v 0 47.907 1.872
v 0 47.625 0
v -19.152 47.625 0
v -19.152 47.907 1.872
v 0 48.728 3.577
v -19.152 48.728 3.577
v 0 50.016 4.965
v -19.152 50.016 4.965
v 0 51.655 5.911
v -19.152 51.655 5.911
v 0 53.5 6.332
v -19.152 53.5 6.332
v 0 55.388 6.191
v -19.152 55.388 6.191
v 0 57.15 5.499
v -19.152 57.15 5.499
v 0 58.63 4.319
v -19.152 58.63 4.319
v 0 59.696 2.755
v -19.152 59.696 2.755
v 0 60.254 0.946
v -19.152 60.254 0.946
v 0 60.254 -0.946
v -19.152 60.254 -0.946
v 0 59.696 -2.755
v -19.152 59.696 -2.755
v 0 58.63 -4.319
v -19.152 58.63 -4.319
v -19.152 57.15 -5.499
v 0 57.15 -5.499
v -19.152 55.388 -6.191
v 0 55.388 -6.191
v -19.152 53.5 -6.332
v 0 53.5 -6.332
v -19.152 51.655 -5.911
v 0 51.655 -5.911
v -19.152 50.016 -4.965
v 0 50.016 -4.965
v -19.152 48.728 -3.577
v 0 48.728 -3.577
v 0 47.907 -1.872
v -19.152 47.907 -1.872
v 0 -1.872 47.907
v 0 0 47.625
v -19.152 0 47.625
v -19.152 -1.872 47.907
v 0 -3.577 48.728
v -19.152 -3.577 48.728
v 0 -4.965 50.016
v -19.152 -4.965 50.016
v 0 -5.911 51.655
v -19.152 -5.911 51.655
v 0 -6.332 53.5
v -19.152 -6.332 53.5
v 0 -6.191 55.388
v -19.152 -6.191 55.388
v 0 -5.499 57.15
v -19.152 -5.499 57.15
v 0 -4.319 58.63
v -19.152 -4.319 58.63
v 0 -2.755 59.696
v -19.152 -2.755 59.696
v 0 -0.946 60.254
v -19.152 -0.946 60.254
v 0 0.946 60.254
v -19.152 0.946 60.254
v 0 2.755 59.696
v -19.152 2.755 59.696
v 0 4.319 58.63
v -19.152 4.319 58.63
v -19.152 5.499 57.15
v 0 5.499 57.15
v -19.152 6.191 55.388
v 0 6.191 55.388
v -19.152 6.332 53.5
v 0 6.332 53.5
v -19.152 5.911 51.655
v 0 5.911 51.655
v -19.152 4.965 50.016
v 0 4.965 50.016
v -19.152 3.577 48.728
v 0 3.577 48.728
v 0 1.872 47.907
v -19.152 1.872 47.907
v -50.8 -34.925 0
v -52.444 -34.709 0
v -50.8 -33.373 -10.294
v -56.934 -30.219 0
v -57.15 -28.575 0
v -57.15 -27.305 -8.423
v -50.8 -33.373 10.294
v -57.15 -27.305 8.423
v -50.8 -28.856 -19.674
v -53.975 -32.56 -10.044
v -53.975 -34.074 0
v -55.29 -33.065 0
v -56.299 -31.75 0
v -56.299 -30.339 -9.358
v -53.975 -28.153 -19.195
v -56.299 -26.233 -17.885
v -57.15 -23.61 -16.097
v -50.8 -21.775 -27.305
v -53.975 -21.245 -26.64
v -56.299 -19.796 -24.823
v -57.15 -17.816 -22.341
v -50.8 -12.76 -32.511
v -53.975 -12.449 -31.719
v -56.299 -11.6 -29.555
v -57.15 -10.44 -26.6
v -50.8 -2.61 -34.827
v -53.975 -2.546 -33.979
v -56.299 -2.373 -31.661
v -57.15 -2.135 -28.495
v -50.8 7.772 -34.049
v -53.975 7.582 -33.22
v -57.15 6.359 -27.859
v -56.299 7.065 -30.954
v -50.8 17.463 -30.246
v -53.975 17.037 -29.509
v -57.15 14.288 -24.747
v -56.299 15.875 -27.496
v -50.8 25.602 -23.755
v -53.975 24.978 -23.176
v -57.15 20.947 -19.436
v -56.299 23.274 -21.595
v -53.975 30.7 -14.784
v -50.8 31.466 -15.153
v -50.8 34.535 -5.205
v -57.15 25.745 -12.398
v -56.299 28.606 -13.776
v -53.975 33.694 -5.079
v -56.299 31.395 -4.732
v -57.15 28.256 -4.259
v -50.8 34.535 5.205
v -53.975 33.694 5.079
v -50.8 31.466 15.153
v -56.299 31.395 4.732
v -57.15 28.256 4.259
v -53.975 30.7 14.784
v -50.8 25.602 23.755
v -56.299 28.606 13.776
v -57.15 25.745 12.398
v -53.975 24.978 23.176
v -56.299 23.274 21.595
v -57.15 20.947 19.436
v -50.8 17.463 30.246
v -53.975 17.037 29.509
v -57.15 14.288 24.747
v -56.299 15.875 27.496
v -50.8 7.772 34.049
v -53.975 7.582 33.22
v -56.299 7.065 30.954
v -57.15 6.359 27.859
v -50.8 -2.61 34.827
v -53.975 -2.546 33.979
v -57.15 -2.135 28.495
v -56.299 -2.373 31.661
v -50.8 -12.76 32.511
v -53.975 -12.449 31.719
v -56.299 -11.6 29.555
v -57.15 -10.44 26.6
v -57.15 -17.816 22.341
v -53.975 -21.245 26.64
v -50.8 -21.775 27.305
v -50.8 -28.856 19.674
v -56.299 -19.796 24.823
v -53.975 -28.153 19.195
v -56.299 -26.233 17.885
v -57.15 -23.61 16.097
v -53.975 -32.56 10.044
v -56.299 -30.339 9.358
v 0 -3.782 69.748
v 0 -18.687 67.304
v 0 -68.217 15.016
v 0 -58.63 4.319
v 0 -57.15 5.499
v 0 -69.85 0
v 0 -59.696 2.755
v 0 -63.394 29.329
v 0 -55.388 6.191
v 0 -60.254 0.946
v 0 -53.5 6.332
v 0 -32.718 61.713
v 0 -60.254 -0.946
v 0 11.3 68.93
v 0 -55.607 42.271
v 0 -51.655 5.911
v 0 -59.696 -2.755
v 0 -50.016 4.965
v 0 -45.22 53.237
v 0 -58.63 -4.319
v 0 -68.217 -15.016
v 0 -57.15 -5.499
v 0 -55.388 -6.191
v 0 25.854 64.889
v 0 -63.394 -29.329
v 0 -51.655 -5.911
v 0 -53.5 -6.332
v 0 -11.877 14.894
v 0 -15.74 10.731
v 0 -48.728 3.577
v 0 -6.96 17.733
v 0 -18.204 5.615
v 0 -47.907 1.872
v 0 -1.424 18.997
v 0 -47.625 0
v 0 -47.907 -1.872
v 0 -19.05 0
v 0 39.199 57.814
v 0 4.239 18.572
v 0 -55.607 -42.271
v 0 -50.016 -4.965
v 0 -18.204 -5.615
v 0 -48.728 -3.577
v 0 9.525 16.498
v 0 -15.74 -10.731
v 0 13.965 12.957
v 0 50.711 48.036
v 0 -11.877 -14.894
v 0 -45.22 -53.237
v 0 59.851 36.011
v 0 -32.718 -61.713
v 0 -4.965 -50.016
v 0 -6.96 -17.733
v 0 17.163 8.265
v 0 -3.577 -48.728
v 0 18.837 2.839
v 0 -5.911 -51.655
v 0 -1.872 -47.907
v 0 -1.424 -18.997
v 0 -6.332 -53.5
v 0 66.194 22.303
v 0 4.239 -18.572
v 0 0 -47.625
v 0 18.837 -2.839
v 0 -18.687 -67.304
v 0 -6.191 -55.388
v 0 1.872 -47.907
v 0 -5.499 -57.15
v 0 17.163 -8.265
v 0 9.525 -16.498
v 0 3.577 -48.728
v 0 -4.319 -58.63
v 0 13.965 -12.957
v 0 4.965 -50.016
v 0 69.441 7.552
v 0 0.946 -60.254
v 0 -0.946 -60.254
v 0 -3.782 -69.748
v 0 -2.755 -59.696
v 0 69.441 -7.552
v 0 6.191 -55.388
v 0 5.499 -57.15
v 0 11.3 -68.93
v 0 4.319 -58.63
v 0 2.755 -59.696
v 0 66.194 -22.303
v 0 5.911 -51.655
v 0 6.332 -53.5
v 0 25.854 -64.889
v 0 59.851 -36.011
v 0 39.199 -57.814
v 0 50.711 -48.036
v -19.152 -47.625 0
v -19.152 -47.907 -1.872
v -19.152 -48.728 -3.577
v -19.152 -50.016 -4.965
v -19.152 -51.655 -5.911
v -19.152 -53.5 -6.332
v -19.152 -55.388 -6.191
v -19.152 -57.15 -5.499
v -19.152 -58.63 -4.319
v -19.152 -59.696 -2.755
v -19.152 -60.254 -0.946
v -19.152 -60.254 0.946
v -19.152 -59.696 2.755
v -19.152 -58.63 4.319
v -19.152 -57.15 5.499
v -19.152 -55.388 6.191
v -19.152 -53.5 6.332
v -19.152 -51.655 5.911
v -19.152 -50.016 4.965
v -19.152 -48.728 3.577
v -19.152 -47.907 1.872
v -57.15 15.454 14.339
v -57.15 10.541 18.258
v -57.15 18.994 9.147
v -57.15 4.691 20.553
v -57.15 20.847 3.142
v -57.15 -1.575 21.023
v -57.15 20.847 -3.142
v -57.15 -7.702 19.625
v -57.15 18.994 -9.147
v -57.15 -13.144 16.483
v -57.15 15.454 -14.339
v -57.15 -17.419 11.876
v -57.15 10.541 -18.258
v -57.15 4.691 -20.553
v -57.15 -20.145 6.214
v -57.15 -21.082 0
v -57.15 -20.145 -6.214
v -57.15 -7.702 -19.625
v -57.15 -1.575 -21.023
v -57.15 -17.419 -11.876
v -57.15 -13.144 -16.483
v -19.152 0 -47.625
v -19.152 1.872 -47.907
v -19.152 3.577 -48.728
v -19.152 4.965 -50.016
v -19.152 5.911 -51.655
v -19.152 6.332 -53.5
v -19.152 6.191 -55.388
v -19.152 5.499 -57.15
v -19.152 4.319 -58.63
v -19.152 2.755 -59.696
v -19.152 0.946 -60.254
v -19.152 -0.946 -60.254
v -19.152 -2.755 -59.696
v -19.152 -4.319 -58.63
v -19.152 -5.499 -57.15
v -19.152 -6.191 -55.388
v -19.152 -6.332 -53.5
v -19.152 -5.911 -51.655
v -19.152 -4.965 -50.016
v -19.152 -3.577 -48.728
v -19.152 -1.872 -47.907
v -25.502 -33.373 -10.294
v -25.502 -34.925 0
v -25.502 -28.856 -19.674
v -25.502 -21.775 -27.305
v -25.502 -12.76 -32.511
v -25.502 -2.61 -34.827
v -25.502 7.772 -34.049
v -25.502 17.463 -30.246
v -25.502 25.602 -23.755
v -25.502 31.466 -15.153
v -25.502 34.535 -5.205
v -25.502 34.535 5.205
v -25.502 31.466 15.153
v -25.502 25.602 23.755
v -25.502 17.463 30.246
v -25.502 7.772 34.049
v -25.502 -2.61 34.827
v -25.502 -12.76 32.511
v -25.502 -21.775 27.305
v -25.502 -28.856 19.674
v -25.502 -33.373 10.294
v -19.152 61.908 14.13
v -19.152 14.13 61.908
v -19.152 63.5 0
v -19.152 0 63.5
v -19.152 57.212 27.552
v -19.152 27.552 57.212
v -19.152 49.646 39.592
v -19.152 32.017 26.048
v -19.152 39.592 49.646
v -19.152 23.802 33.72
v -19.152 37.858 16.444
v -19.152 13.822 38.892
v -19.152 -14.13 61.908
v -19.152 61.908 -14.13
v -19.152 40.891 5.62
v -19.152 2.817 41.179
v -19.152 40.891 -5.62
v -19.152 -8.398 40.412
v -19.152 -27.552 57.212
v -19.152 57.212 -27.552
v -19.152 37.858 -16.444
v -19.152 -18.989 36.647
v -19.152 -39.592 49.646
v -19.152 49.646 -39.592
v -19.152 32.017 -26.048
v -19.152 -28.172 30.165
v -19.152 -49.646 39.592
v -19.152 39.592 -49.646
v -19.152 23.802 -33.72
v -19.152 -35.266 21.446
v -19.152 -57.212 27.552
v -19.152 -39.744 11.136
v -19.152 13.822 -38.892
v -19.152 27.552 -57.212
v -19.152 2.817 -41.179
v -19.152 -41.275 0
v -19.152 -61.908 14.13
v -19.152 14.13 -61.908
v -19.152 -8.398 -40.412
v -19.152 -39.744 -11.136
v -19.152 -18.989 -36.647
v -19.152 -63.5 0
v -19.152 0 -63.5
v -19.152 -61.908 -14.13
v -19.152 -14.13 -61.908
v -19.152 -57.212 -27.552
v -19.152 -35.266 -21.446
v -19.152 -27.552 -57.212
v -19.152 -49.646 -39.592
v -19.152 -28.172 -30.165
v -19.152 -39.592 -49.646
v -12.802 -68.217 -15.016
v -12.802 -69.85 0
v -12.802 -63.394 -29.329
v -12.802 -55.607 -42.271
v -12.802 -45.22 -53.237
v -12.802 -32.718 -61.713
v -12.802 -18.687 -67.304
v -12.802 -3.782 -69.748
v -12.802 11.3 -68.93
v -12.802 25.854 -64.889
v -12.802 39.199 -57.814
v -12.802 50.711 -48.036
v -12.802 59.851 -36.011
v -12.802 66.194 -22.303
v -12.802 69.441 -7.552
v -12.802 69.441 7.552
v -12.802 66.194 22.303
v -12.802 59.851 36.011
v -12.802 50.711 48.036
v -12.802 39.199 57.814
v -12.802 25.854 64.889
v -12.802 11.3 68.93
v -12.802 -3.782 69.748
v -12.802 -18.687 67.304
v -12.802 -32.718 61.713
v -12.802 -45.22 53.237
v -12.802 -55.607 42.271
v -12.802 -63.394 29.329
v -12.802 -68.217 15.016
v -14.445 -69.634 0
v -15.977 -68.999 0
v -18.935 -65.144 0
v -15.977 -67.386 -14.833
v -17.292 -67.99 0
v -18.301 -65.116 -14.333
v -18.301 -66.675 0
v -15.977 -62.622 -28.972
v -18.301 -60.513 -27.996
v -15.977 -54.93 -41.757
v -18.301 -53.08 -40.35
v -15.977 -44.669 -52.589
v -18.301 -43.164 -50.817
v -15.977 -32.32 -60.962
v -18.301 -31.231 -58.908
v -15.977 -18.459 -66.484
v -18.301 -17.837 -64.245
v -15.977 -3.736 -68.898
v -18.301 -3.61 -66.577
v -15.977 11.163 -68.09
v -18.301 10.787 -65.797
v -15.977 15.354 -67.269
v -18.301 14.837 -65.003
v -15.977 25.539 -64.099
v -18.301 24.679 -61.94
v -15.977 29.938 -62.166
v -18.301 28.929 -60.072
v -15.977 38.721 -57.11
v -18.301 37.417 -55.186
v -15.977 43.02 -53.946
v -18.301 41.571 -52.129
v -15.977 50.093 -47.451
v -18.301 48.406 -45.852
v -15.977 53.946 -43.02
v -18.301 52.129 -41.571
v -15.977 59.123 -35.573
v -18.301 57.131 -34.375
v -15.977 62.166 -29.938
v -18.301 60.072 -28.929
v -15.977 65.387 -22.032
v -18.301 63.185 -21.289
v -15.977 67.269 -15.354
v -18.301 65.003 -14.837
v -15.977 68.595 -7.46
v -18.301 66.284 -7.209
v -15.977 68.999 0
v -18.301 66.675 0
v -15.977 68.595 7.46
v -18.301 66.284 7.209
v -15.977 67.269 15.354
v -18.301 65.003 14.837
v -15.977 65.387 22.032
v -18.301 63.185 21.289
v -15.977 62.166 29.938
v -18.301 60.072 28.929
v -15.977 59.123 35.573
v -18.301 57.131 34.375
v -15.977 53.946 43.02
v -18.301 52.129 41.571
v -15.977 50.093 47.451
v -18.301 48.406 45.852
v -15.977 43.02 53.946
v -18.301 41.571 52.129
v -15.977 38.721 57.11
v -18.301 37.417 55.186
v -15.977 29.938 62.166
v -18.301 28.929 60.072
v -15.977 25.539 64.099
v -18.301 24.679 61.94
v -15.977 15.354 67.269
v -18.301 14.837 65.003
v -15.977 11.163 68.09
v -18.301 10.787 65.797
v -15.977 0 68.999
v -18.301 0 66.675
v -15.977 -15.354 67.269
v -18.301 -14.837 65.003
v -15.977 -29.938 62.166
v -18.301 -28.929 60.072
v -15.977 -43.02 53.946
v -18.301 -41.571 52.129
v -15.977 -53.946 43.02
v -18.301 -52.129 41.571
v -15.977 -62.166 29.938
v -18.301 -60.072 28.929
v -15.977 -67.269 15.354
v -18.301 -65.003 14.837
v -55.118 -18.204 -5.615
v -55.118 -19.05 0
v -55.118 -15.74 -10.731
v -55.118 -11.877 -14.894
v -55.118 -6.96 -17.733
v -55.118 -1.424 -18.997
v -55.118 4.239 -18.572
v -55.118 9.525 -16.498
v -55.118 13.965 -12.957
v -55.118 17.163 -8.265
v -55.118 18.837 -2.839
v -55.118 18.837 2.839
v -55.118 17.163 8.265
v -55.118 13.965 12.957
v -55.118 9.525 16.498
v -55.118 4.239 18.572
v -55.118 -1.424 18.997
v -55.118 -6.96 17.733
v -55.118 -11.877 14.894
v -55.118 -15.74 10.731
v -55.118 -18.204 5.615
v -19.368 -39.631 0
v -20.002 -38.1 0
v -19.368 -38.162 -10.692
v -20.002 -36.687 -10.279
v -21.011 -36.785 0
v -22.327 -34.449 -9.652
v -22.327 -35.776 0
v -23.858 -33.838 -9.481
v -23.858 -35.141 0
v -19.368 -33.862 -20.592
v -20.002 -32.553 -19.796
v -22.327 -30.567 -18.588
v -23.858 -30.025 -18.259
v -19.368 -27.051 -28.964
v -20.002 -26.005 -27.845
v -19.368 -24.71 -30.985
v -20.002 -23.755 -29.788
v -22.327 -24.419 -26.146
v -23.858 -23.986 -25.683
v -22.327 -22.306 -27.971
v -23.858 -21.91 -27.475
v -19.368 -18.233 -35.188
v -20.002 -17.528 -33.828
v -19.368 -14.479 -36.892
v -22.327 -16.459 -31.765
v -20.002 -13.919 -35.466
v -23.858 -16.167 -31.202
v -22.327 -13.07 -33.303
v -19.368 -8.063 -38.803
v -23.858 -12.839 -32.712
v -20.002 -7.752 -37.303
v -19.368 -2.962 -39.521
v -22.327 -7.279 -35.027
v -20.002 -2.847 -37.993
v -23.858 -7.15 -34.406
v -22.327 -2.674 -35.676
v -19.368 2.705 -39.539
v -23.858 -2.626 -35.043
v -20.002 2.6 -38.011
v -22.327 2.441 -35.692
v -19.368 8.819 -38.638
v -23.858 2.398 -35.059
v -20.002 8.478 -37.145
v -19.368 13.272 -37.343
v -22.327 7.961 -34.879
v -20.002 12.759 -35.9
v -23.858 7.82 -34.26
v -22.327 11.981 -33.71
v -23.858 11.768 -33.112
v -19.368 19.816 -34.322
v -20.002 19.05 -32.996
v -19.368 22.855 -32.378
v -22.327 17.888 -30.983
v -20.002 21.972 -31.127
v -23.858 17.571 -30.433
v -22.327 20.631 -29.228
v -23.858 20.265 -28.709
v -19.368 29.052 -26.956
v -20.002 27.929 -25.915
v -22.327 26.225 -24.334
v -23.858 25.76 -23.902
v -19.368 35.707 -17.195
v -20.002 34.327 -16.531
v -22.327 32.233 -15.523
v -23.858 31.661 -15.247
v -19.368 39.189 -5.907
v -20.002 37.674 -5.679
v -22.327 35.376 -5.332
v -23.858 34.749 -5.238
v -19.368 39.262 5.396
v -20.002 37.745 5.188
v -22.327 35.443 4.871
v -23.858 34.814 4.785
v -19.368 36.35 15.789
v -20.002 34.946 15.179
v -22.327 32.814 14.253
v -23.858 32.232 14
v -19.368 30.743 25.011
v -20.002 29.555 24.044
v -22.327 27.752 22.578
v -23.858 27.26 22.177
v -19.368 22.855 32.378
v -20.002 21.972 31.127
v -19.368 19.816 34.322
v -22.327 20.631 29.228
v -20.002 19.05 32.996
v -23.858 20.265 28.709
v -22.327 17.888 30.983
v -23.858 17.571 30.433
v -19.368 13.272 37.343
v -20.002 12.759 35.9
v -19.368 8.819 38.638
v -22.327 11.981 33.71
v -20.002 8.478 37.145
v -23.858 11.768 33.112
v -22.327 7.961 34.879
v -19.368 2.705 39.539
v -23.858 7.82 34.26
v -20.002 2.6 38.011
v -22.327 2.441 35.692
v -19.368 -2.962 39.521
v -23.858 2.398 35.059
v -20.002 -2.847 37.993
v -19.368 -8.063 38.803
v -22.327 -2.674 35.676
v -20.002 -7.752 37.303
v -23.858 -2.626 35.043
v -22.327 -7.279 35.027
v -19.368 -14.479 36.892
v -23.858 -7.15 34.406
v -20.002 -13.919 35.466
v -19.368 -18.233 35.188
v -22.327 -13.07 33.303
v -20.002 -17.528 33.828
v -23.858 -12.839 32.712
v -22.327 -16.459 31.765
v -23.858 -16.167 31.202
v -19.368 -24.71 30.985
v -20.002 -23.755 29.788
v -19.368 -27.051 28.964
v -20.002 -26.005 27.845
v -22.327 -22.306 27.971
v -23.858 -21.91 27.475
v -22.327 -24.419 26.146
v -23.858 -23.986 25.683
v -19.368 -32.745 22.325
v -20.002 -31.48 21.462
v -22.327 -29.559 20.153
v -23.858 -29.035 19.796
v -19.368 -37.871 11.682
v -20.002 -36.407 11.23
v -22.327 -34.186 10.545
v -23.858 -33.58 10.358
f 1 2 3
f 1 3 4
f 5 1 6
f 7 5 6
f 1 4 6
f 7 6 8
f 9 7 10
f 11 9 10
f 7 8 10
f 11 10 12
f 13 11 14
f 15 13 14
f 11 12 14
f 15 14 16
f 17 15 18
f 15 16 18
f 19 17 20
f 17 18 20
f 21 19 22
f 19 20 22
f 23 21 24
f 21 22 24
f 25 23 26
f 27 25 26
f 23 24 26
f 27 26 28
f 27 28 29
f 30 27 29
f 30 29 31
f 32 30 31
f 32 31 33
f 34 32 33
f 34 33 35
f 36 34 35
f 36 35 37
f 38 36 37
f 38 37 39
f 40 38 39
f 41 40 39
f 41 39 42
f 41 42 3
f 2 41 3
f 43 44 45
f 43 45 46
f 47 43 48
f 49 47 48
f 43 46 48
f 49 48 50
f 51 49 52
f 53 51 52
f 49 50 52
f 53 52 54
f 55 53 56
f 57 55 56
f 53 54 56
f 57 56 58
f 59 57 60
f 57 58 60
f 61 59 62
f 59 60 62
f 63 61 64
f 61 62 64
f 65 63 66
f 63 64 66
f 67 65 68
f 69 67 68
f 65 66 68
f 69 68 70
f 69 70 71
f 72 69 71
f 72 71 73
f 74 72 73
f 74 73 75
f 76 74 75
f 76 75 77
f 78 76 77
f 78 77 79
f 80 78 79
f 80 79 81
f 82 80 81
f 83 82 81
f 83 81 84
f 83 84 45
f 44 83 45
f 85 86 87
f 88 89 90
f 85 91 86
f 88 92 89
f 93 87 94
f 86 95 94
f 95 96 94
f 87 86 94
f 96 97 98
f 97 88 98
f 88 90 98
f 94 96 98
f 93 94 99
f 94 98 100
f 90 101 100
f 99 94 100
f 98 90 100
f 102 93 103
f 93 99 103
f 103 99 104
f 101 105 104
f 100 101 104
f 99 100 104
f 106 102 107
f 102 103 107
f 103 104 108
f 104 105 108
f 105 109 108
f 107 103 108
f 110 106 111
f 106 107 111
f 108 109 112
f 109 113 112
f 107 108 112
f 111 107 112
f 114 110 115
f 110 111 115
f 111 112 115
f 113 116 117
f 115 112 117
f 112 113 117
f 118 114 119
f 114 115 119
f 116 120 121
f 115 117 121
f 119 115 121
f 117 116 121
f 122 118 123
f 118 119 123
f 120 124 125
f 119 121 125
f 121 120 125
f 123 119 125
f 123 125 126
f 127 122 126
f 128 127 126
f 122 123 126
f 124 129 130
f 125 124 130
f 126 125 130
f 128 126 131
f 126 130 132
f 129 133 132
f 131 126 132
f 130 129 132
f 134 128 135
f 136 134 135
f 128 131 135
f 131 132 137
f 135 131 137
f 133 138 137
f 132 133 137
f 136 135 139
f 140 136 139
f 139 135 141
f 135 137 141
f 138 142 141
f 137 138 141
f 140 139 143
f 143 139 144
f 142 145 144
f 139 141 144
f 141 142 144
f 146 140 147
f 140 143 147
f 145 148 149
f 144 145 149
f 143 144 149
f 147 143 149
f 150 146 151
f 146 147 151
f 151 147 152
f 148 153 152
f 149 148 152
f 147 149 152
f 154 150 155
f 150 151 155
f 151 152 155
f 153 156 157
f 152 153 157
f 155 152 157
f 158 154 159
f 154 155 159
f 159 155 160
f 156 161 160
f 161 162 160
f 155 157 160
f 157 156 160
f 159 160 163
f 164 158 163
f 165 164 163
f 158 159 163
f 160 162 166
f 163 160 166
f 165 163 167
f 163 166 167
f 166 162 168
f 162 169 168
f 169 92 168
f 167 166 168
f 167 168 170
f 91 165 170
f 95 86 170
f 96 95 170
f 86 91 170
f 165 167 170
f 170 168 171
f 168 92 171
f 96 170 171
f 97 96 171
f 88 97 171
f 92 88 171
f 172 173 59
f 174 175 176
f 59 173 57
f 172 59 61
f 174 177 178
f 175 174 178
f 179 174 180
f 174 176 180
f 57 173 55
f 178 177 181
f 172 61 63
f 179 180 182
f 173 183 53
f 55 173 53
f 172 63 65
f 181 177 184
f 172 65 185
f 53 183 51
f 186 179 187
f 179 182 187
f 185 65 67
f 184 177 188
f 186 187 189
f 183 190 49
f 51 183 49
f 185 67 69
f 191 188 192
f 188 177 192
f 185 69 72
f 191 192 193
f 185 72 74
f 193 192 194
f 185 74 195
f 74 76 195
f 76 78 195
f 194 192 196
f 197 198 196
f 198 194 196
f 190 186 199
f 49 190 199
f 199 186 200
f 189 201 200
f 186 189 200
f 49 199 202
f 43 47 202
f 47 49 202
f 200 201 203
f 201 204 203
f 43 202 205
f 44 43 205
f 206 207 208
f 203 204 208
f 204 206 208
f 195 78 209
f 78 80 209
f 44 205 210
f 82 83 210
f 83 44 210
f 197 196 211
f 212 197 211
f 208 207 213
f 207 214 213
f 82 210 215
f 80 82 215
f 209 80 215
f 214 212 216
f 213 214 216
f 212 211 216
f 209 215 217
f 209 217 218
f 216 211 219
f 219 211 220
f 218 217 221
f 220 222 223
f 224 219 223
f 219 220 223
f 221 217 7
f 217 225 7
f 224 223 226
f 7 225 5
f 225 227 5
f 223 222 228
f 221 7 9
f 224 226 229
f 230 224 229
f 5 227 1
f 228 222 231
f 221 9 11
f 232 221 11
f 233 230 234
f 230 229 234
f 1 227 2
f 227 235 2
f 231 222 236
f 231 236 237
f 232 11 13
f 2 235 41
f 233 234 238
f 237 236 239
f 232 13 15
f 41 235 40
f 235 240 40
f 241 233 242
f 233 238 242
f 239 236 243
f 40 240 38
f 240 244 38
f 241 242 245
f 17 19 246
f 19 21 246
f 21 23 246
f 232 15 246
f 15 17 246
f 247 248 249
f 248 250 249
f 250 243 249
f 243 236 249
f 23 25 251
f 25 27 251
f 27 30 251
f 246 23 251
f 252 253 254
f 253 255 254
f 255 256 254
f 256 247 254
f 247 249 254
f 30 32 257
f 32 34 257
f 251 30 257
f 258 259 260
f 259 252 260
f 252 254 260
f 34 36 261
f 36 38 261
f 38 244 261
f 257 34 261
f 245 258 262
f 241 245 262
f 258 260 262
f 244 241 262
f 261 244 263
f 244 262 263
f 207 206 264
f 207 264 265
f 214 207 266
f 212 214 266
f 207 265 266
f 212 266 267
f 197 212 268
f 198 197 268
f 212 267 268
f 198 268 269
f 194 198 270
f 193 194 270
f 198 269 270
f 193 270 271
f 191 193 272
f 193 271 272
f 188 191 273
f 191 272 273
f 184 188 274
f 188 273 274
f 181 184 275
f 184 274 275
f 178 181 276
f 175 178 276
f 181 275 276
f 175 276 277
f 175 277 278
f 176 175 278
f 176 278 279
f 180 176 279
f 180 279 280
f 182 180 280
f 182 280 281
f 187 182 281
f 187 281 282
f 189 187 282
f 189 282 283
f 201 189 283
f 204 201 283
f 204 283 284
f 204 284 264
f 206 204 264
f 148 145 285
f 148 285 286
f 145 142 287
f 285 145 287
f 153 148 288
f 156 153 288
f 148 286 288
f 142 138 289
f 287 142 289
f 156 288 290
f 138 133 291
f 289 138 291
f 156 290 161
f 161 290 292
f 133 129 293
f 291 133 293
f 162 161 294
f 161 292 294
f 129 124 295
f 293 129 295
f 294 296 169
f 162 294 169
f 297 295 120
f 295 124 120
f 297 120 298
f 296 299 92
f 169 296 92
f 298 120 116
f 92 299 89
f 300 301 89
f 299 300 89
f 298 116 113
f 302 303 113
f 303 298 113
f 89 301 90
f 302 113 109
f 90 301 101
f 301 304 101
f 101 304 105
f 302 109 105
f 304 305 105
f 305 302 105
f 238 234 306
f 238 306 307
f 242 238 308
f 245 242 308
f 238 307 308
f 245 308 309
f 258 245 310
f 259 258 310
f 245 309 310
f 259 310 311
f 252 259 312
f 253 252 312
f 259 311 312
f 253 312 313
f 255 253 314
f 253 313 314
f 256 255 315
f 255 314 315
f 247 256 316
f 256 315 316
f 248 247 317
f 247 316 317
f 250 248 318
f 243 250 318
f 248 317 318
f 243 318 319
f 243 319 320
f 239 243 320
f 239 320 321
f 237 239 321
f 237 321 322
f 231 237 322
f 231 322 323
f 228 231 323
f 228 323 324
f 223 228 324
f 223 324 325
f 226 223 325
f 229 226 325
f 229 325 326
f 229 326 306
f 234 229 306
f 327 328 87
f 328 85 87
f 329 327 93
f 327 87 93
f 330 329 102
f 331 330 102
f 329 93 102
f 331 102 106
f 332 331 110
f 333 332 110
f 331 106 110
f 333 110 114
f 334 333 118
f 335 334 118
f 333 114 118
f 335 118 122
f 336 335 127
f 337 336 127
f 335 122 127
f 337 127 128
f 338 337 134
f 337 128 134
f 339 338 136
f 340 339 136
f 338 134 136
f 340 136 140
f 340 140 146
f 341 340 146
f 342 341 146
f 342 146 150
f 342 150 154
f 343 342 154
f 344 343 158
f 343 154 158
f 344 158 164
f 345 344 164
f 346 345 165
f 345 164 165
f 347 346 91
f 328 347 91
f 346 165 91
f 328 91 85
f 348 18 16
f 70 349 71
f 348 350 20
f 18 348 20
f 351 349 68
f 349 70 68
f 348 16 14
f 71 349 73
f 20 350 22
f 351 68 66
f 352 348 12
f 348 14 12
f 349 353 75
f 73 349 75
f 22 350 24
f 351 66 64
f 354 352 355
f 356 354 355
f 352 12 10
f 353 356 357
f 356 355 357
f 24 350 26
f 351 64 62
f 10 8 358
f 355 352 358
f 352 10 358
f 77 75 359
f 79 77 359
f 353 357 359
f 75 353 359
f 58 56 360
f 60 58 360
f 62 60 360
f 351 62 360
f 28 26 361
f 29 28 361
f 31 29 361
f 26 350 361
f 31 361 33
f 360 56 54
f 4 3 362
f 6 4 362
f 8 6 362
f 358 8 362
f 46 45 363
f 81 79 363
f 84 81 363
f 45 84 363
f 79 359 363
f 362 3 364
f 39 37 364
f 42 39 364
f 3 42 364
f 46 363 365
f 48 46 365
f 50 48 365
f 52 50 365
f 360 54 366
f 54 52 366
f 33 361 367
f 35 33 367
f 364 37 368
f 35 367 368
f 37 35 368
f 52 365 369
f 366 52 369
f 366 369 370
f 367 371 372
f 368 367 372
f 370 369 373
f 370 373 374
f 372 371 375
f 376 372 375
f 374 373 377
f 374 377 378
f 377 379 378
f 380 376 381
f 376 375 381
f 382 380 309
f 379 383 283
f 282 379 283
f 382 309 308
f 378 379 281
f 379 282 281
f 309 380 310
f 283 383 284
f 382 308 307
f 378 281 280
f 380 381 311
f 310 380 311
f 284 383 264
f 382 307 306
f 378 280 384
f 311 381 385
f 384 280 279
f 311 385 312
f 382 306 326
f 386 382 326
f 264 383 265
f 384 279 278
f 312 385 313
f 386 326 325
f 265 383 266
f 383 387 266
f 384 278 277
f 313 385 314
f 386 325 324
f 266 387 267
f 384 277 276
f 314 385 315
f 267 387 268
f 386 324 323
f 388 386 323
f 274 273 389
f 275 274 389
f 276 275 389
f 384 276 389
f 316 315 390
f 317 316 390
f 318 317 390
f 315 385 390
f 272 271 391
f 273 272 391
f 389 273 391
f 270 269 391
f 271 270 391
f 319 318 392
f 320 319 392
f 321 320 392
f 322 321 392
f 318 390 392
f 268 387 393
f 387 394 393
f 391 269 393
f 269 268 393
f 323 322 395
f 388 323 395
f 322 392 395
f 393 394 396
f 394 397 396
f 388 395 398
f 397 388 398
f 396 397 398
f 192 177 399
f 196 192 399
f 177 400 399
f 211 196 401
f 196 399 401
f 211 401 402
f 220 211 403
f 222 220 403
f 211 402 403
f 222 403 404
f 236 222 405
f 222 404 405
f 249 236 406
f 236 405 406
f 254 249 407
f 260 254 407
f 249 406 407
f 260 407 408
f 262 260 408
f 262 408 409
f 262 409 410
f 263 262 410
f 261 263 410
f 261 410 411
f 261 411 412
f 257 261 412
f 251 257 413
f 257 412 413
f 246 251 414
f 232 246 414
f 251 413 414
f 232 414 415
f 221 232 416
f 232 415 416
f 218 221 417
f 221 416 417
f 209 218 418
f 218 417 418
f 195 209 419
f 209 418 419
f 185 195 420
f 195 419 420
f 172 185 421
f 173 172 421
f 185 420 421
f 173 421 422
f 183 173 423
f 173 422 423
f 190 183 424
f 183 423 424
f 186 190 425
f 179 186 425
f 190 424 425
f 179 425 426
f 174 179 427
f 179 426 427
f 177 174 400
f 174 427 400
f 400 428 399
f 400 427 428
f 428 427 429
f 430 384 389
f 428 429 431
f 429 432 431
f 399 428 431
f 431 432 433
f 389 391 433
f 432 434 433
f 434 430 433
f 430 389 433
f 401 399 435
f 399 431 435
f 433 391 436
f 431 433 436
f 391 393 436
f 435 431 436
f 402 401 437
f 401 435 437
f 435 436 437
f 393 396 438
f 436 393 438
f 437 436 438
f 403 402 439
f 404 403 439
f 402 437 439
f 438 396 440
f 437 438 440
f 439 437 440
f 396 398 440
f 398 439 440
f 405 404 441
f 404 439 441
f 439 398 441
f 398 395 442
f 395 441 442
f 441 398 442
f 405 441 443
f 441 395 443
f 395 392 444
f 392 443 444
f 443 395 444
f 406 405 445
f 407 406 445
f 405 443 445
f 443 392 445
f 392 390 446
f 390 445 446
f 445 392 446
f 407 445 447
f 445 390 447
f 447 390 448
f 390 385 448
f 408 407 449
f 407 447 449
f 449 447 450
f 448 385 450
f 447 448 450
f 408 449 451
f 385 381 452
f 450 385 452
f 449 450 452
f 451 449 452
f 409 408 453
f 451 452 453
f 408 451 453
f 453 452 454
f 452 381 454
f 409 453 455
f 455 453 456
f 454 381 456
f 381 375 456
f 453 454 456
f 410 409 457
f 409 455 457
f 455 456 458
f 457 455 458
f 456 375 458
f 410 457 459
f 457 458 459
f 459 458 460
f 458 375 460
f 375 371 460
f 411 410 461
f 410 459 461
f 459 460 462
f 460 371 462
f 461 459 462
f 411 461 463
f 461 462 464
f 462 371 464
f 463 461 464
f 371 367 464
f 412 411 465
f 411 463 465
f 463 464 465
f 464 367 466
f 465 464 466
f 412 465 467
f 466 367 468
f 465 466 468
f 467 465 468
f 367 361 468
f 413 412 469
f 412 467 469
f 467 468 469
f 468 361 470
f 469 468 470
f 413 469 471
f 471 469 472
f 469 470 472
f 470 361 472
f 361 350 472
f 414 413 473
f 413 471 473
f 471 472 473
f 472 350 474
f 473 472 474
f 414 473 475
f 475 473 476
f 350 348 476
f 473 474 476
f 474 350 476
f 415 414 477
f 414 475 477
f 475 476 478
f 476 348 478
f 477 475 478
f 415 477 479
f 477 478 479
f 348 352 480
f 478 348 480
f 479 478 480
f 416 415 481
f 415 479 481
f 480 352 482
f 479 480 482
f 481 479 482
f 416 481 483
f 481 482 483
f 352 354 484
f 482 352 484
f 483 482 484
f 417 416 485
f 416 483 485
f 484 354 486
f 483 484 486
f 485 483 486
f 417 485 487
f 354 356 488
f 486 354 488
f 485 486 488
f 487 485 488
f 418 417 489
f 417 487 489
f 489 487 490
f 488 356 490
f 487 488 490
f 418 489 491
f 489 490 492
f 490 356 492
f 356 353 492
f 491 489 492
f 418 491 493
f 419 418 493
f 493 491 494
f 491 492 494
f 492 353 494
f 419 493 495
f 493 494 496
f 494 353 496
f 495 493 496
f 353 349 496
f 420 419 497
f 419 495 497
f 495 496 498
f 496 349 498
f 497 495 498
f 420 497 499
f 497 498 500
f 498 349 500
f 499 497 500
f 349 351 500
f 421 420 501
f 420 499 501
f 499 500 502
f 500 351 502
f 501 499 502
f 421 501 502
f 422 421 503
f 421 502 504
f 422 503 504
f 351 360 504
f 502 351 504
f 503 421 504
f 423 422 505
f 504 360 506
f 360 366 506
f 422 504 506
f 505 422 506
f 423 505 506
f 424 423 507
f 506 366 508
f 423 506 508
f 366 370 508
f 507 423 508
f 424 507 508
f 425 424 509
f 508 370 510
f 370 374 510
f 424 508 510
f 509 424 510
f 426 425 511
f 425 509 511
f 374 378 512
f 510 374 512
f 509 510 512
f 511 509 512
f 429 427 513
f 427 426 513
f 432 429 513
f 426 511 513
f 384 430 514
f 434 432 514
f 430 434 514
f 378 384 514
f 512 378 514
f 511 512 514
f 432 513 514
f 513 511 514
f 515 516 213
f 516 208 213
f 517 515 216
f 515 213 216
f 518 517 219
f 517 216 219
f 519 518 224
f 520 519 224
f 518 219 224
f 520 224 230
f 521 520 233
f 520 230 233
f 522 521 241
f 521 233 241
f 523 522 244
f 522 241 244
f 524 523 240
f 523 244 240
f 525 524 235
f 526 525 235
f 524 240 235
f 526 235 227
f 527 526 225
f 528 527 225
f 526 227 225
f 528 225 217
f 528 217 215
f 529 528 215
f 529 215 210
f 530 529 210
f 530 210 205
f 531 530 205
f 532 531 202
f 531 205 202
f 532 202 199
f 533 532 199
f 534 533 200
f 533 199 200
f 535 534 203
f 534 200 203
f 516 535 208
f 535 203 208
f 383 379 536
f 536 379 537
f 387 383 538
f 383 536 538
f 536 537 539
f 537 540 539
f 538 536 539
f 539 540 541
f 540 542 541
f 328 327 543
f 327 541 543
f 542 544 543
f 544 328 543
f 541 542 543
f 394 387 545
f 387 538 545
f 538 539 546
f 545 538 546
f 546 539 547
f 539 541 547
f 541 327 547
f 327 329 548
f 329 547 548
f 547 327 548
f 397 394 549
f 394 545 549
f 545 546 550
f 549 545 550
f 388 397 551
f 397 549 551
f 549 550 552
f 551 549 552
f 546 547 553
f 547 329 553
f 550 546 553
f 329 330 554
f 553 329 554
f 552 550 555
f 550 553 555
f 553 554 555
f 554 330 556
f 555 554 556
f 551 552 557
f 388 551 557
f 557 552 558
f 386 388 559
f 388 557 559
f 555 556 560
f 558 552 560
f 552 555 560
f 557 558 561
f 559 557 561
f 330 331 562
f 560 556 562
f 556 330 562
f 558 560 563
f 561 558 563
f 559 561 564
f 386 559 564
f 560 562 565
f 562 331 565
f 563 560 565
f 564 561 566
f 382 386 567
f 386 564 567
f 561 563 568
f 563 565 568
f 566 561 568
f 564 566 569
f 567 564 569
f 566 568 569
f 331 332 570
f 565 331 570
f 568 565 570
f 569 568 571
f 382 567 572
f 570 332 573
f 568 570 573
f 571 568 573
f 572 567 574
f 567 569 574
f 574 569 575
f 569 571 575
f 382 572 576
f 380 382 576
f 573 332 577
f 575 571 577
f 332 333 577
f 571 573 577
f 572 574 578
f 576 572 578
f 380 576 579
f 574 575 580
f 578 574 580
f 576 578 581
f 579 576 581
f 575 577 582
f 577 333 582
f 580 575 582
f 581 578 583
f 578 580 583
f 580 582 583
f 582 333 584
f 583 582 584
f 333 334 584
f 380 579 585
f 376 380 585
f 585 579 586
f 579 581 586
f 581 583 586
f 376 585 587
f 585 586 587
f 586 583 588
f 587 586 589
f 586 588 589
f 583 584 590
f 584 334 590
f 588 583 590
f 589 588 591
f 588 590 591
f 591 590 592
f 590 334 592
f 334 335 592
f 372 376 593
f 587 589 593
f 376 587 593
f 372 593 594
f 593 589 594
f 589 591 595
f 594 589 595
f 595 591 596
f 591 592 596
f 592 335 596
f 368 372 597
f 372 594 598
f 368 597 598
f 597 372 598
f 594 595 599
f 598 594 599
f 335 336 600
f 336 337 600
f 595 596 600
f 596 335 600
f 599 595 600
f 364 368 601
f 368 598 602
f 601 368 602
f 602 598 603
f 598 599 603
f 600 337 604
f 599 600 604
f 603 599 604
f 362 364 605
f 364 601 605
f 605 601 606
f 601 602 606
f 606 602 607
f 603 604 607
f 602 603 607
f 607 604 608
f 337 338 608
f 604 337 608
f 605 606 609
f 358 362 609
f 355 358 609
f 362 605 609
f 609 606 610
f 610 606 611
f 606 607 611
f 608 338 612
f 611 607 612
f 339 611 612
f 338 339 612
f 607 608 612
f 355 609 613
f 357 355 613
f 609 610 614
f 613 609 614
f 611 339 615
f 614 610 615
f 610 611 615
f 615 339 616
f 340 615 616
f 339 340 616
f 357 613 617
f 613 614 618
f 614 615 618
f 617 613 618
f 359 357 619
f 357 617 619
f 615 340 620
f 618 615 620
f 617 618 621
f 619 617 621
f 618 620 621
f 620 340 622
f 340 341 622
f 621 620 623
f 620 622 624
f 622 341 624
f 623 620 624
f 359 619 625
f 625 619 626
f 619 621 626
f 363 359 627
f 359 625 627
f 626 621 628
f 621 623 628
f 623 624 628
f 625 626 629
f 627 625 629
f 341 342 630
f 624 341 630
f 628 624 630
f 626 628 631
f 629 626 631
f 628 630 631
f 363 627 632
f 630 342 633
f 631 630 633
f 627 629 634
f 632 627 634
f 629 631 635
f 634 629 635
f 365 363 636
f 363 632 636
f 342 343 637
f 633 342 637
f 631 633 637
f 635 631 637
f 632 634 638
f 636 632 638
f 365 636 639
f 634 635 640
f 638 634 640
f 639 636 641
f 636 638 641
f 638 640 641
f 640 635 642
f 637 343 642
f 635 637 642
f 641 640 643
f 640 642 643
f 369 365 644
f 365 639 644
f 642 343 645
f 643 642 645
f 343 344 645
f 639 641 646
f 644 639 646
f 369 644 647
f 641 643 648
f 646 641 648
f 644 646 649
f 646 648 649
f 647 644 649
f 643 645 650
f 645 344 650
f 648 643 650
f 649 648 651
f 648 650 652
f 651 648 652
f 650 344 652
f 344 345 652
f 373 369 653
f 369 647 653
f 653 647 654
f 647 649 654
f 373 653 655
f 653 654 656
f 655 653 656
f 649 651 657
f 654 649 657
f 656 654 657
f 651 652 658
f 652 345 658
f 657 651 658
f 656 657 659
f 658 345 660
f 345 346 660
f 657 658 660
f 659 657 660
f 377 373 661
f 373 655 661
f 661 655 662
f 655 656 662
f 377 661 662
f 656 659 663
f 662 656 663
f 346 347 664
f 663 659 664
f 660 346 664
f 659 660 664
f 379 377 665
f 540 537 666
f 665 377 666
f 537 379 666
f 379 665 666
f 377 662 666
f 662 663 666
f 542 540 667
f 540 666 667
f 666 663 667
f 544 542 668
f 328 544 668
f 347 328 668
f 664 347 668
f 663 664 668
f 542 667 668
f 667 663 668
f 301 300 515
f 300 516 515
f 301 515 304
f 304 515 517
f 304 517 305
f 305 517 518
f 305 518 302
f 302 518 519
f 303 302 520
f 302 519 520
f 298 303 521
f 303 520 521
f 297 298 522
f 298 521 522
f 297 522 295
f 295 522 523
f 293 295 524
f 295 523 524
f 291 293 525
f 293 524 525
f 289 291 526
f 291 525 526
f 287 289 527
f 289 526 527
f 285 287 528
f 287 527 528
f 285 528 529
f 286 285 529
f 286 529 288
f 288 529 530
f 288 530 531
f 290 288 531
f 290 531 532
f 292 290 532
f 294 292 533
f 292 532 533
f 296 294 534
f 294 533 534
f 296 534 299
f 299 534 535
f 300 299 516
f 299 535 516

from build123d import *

# Parameters (mm, degrees)
SKETCH2_R          = 6.35
CUT_EXTRUDE1_DEPTH = 106.839139341
CIRPATTERN1_COUNT  = 4


with BuildPart() as part:
    # Sketch1 → Revolve1 (revolve)
    with BuildSketch(Plane.XY, mode=Mode.PRIVATE) as revolve1_sk:
        with BuildLine():
            Line((-55.118, 19.05), (0, 19.05))
            Line((0, 19.05), (0, 69.85))
            Line((0, 69.85), (-12.8016, 69.85))
            ThreePointArc((-12.8016, 69.85), (-17.291728061, 67.990128061), (-19.1516, 63.5))
            Line((-19.1516, 63.5), (-19.1516, 41.275))
            ThreePointArc((-19.1516, 41.275), (-21.011471939, 36.784871939), (-25.5016, 34.925))
            Line((-25.5016, 34.925), (-50.8, 34.925))
            ThreePointArc((-50.8, 34.925), (-55.290128061, 33.065128061), (-57.15, 28.575))
            Line((-57.15, 28.575), (-57.15, 21.082))
            Line((-57.15, 21.082), (-55.118, 19.05))
        make_face()
    revolve(revolve1_sk.sketch.rotate(Axis((-117.274050633, 0, 0), (1, 0, 0)), 180), axis=Axis((-117.274050633, 0, 0), (1, 0, 0)))

    # Sketch2 → Cut-Extrude1 (cut, through all)
    with BuildSketch(Plane.ZY.offset(19.1516)):
        with Locations(Location((0, 53.975, 0), (0, 0, 270))):
            Circle(SKETCH2_R)
    cut_extrude1 = extrude(amount=-CUT_EXTRUDE1_DEPTH, mode=Mode.SUBTRACT)

    # CirPattern1: Cut-Extrude1 ×4 about axis
    cirpattern1_axis = Axis((0, 0, 0), (1, 0, 0))
    for i in range(1, CIRPATTERN1_COUNT):
        add(cut_extrude1.rotate(cirpattern1_axis, i * 360 / CIRPATTERN1_COUNT), mode=Mode.SUBTRACT)


solid = part.part
